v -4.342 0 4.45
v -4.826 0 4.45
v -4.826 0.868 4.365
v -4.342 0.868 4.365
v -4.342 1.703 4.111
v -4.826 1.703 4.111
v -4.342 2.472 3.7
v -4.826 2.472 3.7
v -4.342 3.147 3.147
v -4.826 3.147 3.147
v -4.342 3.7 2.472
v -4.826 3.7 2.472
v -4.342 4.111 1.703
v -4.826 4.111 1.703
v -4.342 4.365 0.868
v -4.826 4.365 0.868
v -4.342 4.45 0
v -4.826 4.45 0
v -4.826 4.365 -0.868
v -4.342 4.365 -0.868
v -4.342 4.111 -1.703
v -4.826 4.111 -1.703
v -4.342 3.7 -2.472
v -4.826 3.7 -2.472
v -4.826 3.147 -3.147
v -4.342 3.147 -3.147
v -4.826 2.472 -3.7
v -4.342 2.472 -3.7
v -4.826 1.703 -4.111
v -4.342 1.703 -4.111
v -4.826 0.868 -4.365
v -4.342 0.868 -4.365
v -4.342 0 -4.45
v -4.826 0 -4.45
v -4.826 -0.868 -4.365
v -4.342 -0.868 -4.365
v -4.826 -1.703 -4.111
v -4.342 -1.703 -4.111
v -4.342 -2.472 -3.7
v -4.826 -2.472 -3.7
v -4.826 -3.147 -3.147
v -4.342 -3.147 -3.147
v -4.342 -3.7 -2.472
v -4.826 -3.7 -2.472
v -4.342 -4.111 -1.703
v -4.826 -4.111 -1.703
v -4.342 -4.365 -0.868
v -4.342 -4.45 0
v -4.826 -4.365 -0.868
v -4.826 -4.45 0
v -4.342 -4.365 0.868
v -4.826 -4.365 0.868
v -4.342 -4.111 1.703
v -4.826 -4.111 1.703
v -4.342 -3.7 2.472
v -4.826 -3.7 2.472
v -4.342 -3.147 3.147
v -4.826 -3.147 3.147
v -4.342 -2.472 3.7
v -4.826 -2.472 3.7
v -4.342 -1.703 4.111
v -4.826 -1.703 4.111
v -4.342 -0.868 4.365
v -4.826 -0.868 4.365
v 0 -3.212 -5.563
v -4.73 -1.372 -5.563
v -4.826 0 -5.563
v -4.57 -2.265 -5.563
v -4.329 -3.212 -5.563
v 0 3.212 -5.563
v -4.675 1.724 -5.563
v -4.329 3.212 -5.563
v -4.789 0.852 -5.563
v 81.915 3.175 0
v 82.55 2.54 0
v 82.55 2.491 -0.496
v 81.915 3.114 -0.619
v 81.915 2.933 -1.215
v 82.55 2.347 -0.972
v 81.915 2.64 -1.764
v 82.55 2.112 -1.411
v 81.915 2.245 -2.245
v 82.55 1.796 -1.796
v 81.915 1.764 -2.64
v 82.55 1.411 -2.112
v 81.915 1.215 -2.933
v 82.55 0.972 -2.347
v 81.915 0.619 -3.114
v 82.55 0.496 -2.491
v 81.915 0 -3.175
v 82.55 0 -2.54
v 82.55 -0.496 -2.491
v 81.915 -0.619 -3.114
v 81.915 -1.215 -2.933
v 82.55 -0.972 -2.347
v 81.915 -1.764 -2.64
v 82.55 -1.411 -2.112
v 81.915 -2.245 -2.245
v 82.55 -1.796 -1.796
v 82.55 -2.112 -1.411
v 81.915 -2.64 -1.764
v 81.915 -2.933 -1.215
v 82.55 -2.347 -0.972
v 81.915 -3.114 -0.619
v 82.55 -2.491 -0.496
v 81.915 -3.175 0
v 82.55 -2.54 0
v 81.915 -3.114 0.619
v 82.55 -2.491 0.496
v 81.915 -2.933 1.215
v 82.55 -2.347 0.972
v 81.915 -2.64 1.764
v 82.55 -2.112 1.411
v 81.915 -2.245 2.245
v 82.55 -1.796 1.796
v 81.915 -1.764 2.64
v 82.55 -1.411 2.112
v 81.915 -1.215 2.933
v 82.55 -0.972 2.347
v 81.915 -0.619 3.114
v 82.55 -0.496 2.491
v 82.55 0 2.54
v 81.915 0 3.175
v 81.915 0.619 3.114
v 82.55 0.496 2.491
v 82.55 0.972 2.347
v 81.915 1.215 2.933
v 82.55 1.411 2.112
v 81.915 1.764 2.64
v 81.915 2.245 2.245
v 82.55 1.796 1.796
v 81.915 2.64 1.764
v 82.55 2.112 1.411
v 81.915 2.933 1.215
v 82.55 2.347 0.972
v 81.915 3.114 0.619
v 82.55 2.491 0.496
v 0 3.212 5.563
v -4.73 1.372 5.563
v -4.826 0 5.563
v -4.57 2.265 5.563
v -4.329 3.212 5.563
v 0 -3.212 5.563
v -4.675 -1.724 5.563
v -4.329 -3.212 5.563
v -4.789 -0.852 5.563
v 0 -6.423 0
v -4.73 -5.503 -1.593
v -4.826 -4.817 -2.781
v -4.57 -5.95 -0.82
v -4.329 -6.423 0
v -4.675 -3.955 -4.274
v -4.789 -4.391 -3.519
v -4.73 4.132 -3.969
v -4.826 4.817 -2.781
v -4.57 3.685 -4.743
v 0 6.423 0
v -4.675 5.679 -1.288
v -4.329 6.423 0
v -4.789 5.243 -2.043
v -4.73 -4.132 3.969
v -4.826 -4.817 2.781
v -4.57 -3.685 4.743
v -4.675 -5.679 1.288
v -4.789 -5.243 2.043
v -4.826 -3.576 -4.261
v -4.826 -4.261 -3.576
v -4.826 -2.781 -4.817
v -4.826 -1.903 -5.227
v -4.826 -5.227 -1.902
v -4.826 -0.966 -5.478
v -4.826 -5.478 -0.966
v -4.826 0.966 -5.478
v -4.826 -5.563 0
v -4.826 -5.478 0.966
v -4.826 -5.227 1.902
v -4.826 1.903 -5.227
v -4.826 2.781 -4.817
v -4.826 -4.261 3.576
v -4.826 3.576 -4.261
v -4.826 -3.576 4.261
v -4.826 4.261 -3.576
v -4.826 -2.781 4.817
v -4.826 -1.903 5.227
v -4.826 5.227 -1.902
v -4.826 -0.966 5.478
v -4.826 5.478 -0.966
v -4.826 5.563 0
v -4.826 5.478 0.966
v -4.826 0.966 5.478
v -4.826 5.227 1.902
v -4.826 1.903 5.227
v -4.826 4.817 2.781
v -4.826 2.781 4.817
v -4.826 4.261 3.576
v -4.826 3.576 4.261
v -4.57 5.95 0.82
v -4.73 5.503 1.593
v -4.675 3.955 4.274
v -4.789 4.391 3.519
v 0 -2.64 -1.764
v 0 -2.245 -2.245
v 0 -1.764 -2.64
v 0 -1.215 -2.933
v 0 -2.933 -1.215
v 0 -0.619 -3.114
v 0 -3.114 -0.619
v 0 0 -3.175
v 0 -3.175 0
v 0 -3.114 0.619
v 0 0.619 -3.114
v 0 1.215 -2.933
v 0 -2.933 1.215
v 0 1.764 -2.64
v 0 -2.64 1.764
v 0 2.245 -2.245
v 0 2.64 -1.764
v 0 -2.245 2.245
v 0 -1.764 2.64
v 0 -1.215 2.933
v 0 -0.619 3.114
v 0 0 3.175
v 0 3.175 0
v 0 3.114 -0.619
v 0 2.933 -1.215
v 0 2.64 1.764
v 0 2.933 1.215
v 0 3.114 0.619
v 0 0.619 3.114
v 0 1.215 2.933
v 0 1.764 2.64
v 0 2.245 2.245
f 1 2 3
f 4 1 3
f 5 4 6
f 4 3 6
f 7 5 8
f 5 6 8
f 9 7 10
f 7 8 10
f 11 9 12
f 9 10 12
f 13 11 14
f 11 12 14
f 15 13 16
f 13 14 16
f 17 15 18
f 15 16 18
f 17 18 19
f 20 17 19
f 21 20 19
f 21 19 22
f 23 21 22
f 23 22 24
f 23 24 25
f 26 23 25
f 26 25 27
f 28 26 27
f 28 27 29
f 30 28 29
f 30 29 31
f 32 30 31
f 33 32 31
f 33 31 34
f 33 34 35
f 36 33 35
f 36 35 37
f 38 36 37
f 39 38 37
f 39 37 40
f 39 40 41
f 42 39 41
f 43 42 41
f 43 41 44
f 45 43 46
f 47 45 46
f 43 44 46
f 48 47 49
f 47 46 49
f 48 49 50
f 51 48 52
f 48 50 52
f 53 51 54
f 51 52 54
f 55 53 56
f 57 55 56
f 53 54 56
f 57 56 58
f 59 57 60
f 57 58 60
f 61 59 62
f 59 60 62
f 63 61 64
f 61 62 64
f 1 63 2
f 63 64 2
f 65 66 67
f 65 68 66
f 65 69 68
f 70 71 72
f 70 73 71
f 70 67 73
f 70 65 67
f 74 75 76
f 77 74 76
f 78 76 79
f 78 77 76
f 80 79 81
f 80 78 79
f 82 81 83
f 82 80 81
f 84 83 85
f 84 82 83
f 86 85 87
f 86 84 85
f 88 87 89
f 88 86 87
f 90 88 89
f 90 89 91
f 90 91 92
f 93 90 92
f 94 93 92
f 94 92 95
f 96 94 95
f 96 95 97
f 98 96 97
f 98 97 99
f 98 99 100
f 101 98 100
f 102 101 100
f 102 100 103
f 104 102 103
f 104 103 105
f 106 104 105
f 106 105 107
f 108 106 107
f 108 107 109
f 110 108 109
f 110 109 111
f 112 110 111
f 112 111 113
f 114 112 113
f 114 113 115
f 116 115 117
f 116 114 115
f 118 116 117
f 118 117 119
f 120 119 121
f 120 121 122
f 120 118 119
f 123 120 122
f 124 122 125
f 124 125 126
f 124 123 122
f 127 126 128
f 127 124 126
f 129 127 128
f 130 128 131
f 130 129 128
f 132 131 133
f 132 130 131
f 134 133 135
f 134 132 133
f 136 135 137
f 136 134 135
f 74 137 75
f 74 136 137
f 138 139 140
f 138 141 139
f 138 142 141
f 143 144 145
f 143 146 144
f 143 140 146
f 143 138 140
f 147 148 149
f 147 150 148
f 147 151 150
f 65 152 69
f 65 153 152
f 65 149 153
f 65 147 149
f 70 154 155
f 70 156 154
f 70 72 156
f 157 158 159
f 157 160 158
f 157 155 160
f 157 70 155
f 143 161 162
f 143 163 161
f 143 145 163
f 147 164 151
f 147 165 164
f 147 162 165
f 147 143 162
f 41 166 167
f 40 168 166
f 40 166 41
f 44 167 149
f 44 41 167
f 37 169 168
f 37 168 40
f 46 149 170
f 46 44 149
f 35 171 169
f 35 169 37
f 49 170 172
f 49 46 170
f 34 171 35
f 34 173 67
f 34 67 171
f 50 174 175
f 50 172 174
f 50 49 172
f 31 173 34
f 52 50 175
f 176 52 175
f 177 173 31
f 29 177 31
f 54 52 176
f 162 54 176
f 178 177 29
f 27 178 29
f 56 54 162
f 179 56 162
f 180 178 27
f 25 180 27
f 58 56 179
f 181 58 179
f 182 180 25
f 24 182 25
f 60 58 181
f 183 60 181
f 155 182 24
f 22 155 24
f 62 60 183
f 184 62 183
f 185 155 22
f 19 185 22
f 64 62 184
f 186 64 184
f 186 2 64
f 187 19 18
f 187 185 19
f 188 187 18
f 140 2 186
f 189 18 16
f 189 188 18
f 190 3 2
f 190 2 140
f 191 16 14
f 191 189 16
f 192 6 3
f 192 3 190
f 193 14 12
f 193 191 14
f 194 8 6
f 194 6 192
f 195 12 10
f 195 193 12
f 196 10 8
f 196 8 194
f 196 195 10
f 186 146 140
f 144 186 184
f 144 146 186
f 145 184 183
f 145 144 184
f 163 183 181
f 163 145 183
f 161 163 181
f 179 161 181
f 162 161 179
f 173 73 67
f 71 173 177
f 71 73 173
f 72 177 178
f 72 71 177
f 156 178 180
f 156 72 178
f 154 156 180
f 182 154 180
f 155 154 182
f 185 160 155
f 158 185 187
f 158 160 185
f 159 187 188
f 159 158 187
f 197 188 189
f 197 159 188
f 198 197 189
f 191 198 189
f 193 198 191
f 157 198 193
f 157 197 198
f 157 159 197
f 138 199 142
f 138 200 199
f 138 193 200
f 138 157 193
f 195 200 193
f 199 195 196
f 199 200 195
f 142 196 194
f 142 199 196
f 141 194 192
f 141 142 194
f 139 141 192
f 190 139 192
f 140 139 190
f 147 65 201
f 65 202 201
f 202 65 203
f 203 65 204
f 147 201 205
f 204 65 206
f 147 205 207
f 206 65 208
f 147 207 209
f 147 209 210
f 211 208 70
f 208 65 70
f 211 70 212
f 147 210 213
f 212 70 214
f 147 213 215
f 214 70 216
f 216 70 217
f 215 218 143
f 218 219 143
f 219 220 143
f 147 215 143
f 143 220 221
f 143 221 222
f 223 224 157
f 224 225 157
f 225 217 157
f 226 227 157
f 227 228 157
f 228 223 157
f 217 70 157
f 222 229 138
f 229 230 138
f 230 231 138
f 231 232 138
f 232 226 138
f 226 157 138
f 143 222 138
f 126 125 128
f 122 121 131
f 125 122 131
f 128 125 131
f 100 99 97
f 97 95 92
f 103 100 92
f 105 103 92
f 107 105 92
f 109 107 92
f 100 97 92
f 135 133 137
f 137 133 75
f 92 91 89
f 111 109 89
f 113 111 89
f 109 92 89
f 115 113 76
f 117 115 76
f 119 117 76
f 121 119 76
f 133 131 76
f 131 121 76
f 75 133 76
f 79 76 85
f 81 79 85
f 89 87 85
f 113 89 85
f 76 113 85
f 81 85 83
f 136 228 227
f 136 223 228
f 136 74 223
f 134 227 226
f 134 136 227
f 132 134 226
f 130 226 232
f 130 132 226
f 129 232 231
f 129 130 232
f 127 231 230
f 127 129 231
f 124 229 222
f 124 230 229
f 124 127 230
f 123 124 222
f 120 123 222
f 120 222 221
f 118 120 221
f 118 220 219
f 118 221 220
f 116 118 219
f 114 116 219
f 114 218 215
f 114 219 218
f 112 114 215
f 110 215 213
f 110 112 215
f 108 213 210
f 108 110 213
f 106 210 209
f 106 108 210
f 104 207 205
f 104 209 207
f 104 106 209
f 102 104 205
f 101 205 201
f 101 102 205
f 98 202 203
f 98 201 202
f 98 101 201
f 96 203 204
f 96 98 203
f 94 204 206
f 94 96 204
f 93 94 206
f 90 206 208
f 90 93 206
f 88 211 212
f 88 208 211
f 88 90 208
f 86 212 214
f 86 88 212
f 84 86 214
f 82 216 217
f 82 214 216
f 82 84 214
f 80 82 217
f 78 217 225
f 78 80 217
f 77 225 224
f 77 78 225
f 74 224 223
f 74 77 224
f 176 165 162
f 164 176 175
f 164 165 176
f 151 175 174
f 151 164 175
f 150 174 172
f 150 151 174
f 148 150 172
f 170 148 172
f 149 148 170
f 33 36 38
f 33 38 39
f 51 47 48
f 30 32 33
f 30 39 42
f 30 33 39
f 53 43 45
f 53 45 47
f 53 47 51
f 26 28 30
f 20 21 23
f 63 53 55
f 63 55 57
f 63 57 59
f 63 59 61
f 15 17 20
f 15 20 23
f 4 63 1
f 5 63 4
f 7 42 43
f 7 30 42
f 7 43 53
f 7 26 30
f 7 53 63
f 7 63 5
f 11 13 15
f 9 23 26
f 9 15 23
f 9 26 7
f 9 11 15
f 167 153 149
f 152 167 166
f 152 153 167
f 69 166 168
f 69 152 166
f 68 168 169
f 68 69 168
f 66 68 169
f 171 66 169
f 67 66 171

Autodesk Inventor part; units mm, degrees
ref_plane "YZ Plane" through (0, 0, 0) normal (1, 0, 0) x (0, 1, 0)
ref_plane "XZ Plane" through (0, 0, 0) normal (0, 1, 0) x (-1, 0, 0)
sketch "Sketch1" plane through (0, 0, 0) normal (0, 0, 1) x (1, 0, 0)
  line L0 (0, 3.175) -> (82.55, 3.175)
  line L1 (82.55, 3.175) -> (82.55, 0)
  line L2 (82.55, 0) -> (0, 0)
  line L3 (0, 0) -> (0, 3.175)
  line L4 (0, -0.635) -> (0, 3.81) projected
  line L5 (-16.51, 0) -> (99.06, 0) projected
  dimension "d1" = 6.35
  dimension "d13" = 82.55
revolve "Body" add sketch "Sketch1" angle 360 about axis through (82.55, 0, 0) along (-1, 0, 0)
sketch "Sketch2" plane through (0, 0, 0) normal (-1, 0, 0) x (0, 0, 1)
  line L0 (0, 6.4231) -> (5.5626, 3.2116)
  line L1 (5.5626, 3.2116) -> (5.5626, -3.2116)
  line L2 (5.5626, -3.2116) -> (0, -6.4231)
  line L3 (0, -6.4231) -> (-5.5626, -3.2116)
  line L4 (-5.5626, -3.2116) -> (-5.5626, 3.2116)
  line L5 (-5.5626, 3.2116) -> (0, 6.4231)
  line L6 (-7.7876, 0) -> (7.7876, 0) projected
  line L7 (0, 8.9924) -> (0, -8.9924) projected
  point P0 (0, 0)
  point P1 (0, 0)
  point P2 (0, 0)
  dimension "d8" = 11.1252
extrude "Head" add sketch "Sketch2" along normal blind 4.826
sketch "Sketch3" plane through (-4.826, 0, 0) normal (-1, 0, 0) x (0, 0, 1)
  circle A0 centre (0, 0) radius 4.4501
  point P0 (0, 0)
  dimension "d18" = 8.9002
extrude "Indent" cut sketch "Sketch3" against normal blind 0.4836
sketch "Sketch4" plane through (0, 0, 0) normal (0, 0, 1) x (1, 0, 0)
  line L0 (-4.826, 5.5626) -> (-4.826, 6.4231)
  line L1 (-4.826, 6.4231) -> (-4.3292, 6.4231)
  line L2 (-4.3292, 6.4231) -> (-4.826, 5.5626)
  line L3 (-5.7912, 0) -> (0.9652, 0) projected
  line L4 (0, 6.4231) -> (-4.826, 6.4231) projected
  line L5 (-4.826, 3.2116) -> (-4.826, 6.4231) projected
  dimension "d4" = 30
  dimension "d17" = 11.1252
revolve "Chamfer1" cut sketch "Sketch4" angle 360 about axis through (-10, 0, 0) along (1, 0, 0)
thread "Thread" size "1/4-20 UNC" class "2A" standard "ANSI Unified Screw Threads" length 70.1675
chamfer "Chamfer2" distance 0.635 distance2 0.6351 1 edges at (82.55, -3.175, 0) measured on face at (82.55, 0.6012, 0.871)
ref_plane "Work Plane1" through (1.75, 0, 0) normal (0, 0, -1) x (1, 0, 0)
equation "\"d1\" = GD"
equation "\"d13\" = NLG"
equation "\"d8\" = SW"
equation "\"d2\" = KOH - SD"
equation "\"d18\" = KOD2"
equation "\"d4\" = ANG1"
equation "\"d17\" = SW"
equation "\"d9\" = GEL"
equation "\"d5\" = -0.5 * SPD + 0.5 * GD"
equation "\"NLG\" = 82.55"
equation "\"GD\" = NND"
equation "\"BDM\" = NND"
equation "\"KOH\" = 4.826"
equation "\"GEL\" = 70.1675"
equation "\"SW\" = 11.1252"
equation "\"SPD\" = GD1"
equation "\"SD\" = 0"
equation "\"ANG1\" = 30deg"
equation "\"GAL\" = 0.635"
equation "\"GUL\" = GAL"
equation "\"KOH2\" = 0.1 * KOH"
equation "\"KOD2\" = 0.8 * SW"
equation "\"GD1\" = 5.08"
equation "\"THREADDIA\" = 6.35"
equation "\"SDH\" = SW"
equation "\"TOA\" = 30deg"
equation "\"RR\" = 0.0635"
equation "\"NND\" = 6.35"
equation "\"SW0\" = SW"
equation "\"SD2\" = NND"
equation "\"E0\" = 1.155 * SW"
properties part number "ANSI B18.6.3 - 1/4-20 UNC - 3.25" material "Steel, Mild"
